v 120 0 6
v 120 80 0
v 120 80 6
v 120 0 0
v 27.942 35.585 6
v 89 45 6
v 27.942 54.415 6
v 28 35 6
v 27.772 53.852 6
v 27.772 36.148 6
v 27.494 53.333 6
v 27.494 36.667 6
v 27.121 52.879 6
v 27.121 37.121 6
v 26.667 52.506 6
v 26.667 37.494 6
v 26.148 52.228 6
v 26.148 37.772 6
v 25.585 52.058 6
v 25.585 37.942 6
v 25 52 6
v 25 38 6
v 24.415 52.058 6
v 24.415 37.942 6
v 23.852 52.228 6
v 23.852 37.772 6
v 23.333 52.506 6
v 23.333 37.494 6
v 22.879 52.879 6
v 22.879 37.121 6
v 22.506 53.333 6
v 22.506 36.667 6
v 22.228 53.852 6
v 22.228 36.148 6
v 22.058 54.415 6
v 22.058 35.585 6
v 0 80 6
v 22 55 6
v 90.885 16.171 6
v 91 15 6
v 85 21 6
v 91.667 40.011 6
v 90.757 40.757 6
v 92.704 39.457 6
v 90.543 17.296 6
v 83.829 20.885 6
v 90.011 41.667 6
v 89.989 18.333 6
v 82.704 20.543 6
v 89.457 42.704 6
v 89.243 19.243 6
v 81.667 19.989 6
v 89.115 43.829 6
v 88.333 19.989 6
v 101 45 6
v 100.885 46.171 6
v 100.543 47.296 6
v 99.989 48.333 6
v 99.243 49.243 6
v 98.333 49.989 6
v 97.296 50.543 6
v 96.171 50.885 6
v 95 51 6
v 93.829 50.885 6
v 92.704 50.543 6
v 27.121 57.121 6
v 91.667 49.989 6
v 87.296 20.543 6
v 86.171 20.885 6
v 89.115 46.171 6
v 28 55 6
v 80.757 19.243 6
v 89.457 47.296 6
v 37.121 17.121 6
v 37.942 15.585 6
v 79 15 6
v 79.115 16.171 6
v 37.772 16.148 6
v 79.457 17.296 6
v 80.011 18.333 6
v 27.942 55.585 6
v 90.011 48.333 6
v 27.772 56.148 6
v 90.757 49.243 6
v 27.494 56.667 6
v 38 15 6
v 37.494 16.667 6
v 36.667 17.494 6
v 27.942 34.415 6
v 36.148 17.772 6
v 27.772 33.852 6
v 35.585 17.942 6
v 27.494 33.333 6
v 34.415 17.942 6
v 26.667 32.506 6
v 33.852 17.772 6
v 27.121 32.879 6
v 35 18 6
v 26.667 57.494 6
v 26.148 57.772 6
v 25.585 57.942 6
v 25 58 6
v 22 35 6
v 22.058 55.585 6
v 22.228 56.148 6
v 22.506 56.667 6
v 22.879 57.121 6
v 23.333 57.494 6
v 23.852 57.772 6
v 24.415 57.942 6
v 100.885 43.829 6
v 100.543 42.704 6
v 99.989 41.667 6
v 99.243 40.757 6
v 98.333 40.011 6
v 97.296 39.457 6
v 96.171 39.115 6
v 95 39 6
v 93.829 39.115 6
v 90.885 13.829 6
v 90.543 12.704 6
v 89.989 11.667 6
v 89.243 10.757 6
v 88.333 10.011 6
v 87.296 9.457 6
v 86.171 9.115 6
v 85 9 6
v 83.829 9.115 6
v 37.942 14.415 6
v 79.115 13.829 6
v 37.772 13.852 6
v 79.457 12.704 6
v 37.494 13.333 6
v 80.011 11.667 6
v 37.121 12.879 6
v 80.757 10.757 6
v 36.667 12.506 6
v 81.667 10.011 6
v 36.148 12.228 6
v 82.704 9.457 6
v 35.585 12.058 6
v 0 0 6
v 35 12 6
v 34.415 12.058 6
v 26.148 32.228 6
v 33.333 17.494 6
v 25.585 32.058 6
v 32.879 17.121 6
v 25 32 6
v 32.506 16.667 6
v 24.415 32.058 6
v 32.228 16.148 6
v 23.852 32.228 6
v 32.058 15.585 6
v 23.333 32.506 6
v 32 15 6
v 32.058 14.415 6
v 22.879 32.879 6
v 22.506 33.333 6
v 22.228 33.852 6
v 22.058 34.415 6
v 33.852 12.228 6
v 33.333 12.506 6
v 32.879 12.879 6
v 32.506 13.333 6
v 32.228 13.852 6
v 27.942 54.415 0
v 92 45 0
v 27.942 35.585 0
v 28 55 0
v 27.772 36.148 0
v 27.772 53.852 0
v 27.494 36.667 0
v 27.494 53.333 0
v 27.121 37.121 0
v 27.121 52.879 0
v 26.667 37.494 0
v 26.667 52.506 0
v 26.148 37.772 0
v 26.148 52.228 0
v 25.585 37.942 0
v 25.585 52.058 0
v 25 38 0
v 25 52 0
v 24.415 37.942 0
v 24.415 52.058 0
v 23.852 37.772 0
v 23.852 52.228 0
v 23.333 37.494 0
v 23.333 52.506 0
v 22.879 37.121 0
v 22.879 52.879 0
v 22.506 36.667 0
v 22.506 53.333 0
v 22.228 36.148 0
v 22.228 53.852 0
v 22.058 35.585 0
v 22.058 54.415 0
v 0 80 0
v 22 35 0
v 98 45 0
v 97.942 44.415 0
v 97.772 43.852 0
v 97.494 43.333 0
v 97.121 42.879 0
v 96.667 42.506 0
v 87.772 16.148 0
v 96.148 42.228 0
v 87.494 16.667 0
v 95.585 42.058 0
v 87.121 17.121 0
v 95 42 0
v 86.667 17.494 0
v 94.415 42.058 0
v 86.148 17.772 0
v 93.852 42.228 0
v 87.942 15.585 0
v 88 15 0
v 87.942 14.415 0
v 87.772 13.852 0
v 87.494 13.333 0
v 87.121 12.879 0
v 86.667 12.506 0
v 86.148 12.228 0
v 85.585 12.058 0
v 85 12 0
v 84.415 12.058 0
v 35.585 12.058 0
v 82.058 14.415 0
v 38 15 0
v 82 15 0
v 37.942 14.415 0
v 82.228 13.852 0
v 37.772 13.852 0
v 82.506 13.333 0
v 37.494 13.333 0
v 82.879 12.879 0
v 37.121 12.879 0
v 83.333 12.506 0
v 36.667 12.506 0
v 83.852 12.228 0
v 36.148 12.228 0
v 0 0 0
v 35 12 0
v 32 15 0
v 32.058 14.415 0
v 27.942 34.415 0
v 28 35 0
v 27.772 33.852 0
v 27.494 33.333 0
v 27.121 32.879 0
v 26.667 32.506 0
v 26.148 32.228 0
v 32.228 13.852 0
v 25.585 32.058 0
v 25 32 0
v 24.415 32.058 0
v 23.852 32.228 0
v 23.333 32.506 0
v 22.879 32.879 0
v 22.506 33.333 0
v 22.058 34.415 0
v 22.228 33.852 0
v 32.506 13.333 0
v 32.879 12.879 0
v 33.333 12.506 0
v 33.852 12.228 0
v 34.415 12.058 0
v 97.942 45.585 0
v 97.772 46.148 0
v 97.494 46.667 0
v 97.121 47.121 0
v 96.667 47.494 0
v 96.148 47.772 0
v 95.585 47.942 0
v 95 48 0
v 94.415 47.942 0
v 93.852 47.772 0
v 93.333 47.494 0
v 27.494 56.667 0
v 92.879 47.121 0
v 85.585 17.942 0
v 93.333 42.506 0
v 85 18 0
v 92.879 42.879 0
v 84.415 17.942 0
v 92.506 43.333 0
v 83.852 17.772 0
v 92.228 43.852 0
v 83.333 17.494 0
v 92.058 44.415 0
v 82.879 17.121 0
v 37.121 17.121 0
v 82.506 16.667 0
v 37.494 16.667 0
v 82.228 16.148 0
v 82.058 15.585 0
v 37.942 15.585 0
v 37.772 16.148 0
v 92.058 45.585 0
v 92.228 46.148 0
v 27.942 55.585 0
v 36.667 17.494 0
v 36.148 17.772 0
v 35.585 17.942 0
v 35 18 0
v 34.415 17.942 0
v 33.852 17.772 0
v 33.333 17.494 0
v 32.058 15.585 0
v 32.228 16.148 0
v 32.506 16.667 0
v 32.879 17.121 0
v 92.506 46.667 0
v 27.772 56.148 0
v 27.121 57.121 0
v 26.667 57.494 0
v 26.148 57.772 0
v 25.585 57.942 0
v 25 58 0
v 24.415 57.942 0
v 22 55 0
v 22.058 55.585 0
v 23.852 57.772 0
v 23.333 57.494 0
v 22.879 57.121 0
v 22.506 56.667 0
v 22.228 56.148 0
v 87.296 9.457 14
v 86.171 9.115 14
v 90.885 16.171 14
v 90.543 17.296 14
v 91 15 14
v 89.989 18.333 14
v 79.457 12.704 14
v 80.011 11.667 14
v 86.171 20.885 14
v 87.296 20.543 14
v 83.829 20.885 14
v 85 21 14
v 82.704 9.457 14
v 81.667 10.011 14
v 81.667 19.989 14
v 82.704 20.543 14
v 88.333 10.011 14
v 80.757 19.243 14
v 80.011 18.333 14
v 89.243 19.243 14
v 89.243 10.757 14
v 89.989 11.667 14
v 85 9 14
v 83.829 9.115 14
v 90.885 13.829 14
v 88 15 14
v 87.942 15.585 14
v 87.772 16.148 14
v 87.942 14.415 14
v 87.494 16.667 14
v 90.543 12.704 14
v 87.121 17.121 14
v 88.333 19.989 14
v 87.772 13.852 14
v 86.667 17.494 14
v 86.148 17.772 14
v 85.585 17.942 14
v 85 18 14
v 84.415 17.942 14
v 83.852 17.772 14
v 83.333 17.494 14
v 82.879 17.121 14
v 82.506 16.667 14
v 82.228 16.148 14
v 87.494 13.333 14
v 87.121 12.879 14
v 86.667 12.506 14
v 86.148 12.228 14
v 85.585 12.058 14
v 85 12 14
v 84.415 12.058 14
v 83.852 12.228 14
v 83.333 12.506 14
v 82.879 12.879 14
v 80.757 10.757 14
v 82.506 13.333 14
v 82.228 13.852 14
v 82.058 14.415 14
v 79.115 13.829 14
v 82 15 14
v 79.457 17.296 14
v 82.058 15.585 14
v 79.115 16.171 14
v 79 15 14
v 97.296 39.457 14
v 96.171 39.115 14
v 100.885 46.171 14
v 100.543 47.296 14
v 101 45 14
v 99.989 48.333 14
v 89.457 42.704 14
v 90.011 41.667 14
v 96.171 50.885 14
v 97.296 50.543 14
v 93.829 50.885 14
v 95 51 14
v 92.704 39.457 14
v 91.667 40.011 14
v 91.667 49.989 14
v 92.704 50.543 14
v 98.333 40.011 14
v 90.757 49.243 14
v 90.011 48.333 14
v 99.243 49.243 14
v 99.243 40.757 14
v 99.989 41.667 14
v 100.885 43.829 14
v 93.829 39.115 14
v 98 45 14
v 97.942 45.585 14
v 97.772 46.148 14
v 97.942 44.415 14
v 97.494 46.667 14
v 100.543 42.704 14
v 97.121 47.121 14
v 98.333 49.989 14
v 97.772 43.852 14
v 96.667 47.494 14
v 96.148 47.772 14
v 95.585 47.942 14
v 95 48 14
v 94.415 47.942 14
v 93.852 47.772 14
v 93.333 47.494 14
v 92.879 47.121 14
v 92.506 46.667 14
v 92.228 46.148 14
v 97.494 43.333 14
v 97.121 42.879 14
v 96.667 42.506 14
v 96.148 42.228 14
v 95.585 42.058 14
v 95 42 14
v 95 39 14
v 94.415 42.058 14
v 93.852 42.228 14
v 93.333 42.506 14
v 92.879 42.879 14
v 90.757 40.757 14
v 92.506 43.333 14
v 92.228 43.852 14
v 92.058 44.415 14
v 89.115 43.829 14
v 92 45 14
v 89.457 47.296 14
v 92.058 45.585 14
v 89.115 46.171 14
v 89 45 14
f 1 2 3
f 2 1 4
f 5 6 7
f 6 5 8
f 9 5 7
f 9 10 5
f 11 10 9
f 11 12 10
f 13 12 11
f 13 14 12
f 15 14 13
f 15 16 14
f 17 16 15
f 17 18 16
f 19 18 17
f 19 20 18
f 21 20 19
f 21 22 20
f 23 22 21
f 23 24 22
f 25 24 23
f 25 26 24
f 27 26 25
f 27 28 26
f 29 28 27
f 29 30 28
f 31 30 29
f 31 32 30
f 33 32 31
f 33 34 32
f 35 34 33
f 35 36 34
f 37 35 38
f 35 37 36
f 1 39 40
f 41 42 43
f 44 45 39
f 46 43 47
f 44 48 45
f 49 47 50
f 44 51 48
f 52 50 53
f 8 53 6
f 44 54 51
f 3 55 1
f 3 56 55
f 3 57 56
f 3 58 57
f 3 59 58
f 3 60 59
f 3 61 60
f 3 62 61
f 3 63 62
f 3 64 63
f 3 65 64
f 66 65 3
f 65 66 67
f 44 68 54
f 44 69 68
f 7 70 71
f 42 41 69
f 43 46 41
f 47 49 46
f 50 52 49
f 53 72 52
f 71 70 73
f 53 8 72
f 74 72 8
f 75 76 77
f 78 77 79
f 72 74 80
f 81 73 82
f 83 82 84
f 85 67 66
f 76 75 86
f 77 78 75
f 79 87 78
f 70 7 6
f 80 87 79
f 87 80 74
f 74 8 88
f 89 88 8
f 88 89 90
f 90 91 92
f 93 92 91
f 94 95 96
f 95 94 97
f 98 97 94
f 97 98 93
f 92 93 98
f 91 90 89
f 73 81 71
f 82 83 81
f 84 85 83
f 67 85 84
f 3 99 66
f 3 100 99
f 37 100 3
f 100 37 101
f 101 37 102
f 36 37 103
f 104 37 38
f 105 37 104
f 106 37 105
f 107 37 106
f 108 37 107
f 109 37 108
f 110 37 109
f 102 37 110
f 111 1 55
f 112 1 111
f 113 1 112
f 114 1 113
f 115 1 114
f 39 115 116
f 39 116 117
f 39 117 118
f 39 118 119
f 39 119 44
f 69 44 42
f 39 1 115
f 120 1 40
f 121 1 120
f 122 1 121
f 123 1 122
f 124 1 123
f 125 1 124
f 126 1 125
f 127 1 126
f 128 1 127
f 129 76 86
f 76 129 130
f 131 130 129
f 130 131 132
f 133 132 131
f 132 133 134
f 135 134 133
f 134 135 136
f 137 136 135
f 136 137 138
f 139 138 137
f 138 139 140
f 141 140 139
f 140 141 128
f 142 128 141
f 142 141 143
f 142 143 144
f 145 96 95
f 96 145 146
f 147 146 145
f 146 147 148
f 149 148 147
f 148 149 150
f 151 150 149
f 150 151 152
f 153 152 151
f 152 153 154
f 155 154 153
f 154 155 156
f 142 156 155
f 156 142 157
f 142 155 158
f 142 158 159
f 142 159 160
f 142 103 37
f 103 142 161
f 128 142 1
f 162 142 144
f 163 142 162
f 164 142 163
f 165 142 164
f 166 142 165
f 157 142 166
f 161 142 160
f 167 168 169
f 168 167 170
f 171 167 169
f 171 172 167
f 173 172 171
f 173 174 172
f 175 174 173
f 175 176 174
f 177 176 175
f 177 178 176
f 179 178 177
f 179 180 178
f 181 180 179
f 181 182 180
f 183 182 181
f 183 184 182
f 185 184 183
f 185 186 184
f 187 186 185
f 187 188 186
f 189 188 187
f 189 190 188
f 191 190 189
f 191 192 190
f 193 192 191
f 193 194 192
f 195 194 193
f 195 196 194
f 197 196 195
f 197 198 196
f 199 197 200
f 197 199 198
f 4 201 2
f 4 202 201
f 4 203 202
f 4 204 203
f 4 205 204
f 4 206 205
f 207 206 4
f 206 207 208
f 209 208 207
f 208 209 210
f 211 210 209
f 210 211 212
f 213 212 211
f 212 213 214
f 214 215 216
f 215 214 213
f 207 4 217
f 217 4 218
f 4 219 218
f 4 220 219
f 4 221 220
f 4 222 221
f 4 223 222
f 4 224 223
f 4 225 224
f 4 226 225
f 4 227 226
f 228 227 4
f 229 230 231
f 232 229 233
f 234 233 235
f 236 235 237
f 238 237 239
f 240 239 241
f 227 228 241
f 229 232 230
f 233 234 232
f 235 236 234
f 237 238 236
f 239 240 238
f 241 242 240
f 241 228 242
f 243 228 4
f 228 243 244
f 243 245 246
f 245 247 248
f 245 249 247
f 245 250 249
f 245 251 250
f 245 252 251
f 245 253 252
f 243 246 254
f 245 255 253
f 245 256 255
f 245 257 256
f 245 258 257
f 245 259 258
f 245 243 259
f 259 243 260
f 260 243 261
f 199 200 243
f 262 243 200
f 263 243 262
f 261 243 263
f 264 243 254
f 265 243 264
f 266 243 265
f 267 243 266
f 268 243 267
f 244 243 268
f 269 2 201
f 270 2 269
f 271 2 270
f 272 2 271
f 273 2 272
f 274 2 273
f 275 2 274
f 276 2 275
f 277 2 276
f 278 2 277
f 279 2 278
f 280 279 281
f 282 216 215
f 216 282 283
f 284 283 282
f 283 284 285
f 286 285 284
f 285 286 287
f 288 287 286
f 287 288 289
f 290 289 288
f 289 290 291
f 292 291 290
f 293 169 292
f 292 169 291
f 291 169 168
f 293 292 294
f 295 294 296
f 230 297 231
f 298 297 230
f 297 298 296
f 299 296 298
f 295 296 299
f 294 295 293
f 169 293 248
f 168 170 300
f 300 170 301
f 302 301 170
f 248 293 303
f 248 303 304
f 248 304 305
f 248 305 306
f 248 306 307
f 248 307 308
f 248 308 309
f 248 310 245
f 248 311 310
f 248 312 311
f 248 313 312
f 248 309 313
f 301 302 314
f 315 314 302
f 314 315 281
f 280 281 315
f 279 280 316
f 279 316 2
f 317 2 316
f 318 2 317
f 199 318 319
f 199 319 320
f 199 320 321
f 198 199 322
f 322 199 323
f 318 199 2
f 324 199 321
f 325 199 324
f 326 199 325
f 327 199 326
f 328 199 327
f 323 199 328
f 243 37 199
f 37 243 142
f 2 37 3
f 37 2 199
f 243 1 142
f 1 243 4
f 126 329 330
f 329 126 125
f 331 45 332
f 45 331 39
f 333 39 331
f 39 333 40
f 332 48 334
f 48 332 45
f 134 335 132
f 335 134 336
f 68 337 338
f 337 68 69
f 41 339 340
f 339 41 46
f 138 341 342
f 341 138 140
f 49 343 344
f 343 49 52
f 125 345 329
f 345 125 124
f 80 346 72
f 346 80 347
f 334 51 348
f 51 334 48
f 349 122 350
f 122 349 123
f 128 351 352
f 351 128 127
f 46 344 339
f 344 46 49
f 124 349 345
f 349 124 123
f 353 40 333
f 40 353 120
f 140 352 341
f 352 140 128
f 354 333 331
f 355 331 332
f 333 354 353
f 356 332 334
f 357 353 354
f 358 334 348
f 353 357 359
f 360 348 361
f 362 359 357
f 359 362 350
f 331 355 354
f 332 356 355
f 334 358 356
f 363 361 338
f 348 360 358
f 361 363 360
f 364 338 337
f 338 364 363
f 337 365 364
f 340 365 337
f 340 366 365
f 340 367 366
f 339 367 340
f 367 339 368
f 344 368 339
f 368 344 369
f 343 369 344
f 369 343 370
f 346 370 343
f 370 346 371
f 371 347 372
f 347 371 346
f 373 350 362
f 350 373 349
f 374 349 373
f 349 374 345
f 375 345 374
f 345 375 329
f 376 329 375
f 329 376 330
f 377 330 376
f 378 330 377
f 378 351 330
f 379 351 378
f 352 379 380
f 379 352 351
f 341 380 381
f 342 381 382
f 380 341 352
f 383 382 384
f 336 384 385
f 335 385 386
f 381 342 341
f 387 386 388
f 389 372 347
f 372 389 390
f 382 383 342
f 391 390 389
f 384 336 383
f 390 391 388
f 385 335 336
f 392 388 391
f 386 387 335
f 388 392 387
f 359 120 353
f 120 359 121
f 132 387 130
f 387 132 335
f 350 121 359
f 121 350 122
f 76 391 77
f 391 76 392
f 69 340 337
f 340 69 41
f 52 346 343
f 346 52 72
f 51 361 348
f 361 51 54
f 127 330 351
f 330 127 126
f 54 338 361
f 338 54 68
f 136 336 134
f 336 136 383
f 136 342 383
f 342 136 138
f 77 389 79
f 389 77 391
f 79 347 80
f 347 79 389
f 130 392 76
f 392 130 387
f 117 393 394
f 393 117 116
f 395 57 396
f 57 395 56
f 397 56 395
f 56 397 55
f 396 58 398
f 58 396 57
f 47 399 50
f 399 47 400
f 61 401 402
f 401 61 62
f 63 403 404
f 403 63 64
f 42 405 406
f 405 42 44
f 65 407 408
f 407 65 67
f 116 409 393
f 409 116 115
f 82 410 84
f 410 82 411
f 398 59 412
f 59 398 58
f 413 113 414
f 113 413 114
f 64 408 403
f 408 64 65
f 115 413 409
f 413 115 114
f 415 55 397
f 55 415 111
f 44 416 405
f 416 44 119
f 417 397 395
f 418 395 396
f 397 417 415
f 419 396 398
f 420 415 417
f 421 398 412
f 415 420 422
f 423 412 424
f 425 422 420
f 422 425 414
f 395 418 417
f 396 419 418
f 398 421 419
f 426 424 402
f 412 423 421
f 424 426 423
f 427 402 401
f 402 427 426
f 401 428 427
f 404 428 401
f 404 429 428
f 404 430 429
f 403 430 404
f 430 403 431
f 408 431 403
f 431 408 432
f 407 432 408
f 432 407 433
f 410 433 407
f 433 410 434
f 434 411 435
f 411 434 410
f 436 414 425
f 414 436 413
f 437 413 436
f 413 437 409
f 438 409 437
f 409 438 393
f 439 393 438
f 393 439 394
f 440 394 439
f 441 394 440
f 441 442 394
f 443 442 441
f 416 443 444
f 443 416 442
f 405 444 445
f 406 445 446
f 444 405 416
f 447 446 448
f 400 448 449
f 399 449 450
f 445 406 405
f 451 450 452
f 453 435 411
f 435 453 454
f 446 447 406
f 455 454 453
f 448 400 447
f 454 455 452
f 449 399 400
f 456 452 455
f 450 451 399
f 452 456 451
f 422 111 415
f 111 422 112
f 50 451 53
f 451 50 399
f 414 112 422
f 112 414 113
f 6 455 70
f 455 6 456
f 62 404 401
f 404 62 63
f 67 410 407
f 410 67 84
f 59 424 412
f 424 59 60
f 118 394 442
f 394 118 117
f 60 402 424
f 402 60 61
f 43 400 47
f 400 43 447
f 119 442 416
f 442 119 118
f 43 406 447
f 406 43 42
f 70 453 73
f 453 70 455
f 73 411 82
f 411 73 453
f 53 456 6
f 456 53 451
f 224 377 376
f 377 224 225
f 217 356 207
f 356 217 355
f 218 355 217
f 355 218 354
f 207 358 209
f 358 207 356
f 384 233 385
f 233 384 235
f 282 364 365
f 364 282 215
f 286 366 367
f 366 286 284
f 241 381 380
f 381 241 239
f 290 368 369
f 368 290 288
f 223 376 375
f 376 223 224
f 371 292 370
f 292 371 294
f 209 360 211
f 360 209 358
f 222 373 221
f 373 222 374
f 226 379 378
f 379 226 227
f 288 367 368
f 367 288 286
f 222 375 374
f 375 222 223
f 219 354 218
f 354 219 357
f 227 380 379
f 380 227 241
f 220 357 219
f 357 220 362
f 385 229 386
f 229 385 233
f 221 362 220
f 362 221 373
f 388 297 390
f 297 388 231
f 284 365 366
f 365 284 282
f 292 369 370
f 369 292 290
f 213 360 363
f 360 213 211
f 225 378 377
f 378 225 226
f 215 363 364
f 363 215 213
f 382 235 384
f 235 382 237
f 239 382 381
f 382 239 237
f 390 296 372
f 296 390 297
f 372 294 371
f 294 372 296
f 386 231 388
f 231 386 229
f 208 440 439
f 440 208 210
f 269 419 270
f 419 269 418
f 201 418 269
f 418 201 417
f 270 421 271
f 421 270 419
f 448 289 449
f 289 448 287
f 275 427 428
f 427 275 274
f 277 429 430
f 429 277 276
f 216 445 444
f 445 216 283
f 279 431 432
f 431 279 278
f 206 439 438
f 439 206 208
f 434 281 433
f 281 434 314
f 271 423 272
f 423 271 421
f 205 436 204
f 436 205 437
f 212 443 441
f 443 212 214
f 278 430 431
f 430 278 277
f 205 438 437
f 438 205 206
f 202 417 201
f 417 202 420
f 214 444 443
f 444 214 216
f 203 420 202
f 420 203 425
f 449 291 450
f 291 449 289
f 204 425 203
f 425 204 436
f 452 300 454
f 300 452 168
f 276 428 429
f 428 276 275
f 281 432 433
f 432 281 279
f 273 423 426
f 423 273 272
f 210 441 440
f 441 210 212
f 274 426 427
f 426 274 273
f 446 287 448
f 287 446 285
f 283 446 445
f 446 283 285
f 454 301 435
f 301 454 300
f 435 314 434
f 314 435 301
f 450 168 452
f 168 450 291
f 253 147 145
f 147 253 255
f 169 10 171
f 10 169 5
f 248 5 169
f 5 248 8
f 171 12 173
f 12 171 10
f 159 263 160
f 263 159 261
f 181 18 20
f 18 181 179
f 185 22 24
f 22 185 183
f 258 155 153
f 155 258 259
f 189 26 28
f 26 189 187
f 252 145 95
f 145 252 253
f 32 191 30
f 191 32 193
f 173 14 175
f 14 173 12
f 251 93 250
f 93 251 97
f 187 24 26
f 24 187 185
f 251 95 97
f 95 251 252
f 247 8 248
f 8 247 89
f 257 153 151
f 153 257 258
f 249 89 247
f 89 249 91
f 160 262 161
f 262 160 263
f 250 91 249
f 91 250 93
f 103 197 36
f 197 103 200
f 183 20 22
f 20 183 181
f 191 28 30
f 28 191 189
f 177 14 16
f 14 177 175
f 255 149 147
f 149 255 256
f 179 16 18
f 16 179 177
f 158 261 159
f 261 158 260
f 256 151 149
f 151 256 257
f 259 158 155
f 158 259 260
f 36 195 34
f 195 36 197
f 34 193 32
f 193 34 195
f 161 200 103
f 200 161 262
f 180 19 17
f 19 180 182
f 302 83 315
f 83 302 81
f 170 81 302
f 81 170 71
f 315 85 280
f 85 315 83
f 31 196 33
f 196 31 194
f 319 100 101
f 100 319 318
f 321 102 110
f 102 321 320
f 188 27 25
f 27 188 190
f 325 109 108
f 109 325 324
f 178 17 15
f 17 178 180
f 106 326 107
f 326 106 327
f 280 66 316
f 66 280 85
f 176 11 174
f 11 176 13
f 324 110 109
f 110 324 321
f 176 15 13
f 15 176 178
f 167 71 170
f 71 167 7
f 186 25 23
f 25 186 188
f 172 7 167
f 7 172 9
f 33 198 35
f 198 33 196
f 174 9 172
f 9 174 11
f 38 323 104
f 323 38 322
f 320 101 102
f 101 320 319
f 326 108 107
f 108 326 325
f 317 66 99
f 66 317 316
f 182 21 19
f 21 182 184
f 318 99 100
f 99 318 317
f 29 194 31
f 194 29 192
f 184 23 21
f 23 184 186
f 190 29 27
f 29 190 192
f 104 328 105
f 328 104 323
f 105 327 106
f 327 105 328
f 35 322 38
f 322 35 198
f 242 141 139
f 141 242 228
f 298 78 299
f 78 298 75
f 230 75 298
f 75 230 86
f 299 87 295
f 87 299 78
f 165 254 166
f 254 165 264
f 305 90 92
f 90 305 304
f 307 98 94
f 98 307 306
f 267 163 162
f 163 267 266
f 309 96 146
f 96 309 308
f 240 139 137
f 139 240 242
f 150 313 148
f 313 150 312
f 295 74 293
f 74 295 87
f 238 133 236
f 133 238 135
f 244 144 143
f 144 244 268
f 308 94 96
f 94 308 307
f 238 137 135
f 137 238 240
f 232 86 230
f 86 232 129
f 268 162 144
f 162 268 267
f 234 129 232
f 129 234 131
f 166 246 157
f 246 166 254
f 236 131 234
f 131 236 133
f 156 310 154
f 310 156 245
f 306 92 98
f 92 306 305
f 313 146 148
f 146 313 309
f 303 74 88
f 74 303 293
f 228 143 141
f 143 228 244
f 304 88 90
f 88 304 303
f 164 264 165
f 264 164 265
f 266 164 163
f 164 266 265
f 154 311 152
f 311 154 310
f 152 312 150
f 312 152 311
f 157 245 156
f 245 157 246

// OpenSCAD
$fn = 32;

// ----------------------------------------------------------------------
// Mixed field: bosses and holes at given coordinates
// ----------------------------------------------------------------------

// --- parameters (mm) ---
plate_l = 120;            // plate length, X
plate_w = 80;             // plate width, Y
plate_t = 6;              // plate thickness, Z
boss_d = 12;              // boss diameter
boss_h = 8;               // boss height above the plate
hole_d = 6;               // through hole diameter
fit_tol = 0.1;            // tolerance for press fits, mm
free_tol = 0.5;           // tolerance for clearance fits, mm

total_h = plate_t + boss_h;  // overall height

difference() {
  union() {
    cube([plate_l, plate_w, plate_t]);
    translate([85, 15, plate_t]) cylinder(h = boss_h, d = boss_d);
    translate([95, 45, plate_t]) cylinder(h = boss_h, d = boss_d);
  }
  translate([85, 15, -1]) cylinder(h = total_h + 2, d = boss_d / 2);
  translate([95, 45, -1]) cylinder(h = total_h + 2, d = boss_d / 2);
  translate([25, 35, -1]) cylinder(h = plate_t + 2, d = hole_d);
  translate([25, 55, -1]) cylinder(h = plate_t + 2, d = hole_d);
  translate([35, 15, -1]) cylinder(h = plate_t + 2, d = hole_d);
}
